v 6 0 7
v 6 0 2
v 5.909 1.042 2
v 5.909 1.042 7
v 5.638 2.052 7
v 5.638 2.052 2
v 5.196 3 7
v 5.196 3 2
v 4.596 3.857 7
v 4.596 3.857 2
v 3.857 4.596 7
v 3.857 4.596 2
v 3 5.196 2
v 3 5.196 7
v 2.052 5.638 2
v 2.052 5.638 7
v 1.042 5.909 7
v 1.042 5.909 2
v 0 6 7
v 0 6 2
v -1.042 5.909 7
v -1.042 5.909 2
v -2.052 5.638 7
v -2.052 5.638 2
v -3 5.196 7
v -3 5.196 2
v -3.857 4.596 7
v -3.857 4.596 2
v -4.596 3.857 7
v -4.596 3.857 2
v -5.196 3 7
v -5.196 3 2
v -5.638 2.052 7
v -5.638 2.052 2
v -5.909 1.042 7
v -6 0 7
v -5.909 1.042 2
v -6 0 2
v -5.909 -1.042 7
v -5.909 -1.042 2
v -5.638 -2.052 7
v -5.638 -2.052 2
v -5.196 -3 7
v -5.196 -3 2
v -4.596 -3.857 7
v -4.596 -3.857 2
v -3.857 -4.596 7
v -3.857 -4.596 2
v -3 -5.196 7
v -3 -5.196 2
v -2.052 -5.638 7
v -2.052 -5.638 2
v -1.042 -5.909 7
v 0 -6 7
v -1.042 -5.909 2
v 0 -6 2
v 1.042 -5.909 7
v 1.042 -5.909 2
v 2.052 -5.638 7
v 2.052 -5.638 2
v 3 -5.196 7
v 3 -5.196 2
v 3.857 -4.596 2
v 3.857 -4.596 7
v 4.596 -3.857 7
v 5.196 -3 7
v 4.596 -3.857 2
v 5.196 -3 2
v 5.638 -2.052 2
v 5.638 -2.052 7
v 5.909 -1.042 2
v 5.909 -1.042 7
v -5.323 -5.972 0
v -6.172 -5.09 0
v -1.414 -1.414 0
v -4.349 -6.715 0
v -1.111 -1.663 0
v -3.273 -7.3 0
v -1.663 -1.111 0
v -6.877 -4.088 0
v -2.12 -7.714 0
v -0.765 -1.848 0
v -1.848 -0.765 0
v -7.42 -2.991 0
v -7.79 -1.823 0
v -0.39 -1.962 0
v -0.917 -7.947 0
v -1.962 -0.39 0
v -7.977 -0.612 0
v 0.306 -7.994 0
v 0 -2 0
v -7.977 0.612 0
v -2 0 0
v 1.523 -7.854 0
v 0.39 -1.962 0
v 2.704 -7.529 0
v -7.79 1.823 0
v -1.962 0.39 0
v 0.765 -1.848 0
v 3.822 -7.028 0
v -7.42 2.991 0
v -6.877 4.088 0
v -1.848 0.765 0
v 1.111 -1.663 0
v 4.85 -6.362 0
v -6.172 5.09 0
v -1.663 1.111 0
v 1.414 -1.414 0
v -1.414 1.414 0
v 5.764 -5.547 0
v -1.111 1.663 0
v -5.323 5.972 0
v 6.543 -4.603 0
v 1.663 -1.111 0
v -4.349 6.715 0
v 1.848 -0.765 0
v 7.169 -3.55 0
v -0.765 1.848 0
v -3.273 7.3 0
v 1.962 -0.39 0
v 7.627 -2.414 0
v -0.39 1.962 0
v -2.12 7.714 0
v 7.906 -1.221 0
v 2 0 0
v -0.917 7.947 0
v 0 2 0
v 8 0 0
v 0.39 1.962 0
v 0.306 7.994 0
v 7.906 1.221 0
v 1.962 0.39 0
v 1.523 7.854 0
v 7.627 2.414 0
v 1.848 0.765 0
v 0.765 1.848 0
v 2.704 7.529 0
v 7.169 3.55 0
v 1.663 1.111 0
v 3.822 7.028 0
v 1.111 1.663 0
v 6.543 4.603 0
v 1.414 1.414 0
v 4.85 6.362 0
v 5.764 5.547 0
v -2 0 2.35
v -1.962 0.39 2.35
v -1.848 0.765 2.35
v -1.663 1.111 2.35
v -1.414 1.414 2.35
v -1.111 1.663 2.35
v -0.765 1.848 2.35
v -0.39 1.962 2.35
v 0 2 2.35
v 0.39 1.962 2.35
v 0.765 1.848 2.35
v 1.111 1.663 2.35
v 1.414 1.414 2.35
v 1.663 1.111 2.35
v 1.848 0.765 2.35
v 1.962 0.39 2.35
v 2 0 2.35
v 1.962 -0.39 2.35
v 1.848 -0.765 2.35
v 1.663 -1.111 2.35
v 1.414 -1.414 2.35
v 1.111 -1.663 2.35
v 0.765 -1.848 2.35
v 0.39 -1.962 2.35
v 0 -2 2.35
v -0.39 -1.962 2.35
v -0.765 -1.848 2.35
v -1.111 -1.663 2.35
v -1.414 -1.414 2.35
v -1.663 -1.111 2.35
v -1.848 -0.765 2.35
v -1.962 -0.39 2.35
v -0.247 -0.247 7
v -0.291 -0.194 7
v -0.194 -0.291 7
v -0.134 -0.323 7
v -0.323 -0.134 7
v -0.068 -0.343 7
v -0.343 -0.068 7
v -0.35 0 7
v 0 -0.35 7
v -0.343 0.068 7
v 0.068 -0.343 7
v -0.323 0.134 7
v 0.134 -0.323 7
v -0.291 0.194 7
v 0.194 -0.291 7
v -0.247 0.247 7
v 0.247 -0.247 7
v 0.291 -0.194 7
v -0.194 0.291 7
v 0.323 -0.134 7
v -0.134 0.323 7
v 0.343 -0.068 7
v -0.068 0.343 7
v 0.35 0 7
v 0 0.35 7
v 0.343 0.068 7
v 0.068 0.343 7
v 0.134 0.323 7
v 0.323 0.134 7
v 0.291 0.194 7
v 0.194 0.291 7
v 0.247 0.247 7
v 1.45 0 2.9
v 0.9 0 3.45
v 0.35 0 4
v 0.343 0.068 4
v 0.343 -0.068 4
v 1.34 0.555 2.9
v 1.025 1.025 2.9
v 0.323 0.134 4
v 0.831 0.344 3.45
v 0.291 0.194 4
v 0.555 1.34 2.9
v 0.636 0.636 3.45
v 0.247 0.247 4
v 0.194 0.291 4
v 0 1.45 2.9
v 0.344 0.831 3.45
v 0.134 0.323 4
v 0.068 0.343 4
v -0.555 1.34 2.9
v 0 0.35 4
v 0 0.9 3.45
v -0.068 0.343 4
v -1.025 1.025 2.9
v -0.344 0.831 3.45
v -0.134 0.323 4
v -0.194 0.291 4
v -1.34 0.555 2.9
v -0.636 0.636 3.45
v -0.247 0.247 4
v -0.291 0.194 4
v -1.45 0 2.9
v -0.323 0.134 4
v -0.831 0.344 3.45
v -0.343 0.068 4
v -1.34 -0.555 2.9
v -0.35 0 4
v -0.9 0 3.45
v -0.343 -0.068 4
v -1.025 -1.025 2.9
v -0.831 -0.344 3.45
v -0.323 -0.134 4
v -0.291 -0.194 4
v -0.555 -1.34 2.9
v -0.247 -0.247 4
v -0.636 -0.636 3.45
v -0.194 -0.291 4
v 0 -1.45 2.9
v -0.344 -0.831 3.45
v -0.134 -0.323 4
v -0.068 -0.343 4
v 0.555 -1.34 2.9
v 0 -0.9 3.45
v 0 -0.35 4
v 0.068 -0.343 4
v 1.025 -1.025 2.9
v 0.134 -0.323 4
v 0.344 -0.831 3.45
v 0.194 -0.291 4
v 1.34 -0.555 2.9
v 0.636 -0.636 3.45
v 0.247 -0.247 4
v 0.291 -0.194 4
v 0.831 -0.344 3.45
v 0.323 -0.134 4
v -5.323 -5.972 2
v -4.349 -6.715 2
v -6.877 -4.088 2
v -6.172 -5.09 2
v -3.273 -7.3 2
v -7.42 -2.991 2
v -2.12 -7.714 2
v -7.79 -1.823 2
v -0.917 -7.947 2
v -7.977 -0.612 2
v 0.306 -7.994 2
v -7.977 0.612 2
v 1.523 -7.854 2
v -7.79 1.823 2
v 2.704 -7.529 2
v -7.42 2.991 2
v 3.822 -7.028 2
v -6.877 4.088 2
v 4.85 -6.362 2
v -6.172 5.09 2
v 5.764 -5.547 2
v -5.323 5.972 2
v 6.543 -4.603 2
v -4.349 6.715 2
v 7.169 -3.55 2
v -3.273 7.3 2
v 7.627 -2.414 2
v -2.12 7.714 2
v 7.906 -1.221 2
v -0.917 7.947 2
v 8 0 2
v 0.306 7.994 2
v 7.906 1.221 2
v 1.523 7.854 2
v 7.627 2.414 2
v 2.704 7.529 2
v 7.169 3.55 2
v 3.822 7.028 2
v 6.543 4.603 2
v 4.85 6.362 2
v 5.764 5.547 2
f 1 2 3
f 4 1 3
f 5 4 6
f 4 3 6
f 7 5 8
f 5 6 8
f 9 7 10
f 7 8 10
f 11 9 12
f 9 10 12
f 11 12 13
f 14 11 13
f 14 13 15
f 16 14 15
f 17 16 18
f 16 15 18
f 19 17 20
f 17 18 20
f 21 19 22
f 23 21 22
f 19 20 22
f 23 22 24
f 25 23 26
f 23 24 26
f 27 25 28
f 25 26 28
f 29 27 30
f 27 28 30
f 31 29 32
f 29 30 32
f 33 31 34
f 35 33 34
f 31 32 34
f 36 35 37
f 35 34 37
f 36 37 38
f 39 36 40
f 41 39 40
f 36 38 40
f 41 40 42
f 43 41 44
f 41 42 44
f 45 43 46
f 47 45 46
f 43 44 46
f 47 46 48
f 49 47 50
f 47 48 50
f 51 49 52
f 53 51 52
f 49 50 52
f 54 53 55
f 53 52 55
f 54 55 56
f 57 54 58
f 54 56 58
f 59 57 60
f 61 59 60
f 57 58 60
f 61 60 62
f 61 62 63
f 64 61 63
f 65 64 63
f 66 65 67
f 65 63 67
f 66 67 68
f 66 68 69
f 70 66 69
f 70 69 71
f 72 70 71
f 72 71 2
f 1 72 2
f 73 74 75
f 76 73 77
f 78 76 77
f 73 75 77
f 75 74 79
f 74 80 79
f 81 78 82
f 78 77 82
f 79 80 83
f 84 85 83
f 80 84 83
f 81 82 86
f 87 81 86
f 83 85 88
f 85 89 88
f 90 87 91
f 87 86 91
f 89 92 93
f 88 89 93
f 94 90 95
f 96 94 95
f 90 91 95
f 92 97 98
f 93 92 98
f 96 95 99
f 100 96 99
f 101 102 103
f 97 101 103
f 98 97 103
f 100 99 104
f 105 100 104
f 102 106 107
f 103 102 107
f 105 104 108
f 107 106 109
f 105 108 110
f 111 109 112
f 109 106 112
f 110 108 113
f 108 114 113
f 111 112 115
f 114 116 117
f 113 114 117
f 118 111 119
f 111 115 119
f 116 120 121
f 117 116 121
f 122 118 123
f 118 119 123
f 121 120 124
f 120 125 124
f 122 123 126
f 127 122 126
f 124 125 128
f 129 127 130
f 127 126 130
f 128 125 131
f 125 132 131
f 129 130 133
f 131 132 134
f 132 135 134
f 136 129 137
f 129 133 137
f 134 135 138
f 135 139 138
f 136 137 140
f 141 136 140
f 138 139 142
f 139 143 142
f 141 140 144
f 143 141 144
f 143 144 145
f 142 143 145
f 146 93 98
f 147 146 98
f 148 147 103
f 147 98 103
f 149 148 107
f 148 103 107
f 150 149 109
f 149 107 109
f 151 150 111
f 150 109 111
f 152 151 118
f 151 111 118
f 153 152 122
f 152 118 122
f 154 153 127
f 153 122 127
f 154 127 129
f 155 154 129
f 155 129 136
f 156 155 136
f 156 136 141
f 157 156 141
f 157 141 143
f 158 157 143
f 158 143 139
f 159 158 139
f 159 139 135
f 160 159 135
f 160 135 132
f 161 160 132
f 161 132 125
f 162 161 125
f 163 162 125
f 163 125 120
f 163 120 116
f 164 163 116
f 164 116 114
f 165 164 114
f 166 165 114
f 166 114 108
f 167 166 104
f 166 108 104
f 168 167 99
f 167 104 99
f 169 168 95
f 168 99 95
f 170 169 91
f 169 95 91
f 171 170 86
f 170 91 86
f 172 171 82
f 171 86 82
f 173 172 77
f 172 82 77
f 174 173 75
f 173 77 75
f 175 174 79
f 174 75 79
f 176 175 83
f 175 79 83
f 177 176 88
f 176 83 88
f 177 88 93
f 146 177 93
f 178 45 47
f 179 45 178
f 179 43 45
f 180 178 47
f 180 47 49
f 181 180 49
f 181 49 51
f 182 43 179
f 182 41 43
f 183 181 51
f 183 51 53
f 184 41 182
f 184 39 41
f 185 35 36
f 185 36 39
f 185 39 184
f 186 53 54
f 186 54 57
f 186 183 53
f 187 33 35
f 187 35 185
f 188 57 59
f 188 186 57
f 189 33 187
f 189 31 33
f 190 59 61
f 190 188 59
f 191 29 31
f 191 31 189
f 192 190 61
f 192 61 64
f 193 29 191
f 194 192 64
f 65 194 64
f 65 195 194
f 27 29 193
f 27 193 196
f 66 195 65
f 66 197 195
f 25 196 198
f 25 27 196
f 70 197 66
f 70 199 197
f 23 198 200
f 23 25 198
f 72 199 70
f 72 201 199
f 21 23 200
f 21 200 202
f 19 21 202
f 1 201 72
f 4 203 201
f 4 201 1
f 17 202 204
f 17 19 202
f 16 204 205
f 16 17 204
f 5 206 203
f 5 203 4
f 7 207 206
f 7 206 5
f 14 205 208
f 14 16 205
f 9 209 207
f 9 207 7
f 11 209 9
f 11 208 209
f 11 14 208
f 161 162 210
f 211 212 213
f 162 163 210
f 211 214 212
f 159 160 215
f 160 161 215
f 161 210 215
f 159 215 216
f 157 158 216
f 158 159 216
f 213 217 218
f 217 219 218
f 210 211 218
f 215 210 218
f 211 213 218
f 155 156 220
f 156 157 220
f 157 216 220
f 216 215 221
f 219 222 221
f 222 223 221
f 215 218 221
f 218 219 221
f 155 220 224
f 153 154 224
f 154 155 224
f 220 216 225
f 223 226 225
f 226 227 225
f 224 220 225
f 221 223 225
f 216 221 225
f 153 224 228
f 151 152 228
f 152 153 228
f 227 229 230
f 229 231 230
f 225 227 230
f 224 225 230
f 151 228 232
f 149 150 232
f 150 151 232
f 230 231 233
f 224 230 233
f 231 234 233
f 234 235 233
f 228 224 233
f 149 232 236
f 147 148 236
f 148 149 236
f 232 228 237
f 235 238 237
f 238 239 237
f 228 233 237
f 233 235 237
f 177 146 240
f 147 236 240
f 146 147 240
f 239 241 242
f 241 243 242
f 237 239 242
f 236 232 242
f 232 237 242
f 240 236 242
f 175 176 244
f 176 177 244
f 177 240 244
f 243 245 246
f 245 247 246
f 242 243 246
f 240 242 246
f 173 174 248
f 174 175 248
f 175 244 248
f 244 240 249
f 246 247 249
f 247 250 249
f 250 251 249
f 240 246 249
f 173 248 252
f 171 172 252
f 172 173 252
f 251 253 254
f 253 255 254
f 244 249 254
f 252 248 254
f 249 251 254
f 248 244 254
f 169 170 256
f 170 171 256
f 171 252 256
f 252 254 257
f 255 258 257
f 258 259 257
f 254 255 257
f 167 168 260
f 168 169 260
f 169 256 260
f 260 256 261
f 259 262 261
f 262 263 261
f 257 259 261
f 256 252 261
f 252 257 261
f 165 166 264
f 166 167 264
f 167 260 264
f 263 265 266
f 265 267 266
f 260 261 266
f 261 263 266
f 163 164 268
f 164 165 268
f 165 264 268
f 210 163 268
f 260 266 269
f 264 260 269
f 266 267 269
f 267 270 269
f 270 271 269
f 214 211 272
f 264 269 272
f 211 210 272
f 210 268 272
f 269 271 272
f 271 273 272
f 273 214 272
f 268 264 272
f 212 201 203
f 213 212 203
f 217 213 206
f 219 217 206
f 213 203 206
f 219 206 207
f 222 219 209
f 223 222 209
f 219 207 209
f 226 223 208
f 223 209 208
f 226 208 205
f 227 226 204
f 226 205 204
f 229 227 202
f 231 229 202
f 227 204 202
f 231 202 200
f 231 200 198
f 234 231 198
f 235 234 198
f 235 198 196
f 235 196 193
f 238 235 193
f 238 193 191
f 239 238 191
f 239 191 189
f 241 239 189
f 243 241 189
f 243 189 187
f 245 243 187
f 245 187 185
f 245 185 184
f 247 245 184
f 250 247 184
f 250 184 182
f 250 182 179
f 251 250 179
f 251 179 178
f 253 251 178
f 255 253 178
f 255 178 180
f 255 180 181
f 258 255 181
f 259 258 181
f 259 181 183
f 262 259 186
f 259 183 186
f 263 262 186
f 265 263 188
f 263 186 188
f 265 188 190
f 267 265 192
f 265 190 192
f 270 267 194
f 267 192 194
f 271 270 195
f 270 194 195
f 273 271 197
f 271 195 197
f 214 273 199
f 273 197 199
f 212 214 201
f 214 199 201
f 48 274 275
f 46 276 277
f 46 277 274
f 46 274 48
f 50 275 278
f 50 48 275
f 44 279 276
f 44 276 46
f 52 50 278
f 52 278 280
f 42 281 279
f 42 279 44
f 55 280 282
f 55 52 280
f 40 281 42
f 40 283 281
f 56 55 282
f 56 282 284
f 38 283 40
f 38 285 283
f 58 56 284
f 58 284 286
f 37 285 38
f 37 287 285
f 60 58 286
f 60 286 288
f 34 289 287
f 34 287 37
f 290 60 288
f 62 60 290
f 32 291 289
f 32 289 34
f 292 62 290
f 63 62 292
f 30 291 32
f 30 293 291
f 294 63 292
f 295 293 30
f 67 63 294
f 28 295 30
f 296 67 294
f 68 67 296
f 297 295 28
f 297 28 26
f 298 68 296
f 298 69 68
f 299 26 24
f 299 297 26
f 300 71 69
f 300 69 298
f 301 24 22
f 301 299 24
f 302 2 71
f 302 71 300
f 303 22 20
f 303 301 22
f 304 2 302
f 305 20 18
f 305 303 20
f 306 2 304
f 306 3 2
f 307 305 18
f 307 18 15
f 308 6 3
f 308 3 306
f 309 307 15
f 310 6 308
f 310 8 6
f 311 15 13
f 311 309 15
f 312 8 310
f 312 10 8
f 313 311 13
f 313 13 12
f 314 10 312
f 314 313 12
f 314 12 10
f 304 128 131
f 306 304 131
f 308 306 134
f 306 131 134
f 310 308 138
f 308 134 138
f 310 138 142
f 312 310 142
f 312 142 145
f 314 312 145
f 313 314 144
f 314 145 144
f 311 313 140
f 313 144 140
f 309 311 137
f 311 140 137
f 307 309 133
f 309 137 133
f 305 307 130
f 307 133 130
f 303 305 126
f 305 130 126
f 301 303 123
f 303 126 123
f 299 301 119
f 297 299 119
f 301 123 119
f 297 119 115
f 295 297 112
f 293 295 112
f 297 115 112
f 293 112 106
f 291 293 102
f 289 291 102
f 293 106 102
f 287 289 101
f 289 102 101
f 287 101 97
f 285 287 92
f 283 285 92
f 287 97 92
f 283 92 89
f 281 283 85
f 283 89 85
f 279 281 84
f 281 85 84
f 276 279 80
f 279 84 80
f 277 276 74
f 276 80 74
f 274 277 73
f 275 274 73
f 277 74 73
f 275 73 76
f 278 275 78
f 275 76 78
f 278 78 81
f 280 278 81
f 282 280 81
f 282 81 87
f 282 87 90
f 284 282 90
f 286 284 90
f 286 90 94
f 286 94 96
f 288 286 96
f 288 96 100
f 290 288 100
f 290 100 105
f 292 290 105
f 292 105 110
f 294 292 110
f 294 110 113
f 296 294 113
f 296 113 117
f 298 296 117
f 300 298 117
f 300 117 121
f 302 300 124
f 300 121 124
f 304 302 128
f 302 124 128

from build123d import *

# Parameters (mm, degrees)
SKETCH1_R           = 8
BOSS_EXTRUDE1_DEPTH = 2
SKETCH2_R           = 6
BOSS_EXTRUDE2_DEPTH = 5
SKETCH3_R           = 2
CUT_EXTRUDE1_DEPTH  = 2
SKETCH4_R           = 0.35
CUT_EXTRUDE2_DEPTH  = 14.304134696
CHAMFER2_SIZE       = 2


with BuildPart() as part:
    # Sketch1 → Boss-Extrude1 (new body)
    with BuildSketch(Plane.XY):
        Circle(SKETCH1_R)
    extrude(amount=BOSS_EXTRUDE1_DEPTH)

    # Sketch2 → Boss-Extrude2 (add)
    with BuildSketch(Plane.XY.offset(2)):
        Circle(SKETCH2_R)
    extrude(amount=BOSS_EXTRUDE2_DEPTH)

    # Sketch3 → Cut-Extrude1 (cut)
    with BuildSketch(Plane(origin=(0, 0, 0), x_dir=(-1, 0, 0), z_dir=(0, 0, -1))):
        Circle(SKETCH3_R)
    extrude(amount=-CUT_EXTRUDE1_DEPTH, mode=Mode.SUBTRACT)

    # Sketch4 → Cut-Extrude2 (cut, through all)
    with BuildSketch(Plane.XY.offset(7)):
        Circle(SKETCH4_R)
    extrude(amount=-CUT_EXTRUDE2_DEPTH, mode=Mode.SUBTRACT)

    # Chamfer2
    # the kernel refuses this chamfer: 2 mm, written as the material it takes off along each edge
    with BuildSketch(Plane(origin=(0, 0, 2), x_dir=(1, 0, 0), z_dir=(0, -1, 0))) as chamfer2_piece_1_section:
        Polygon((0.35 + CHAMFER2_SIZE, 0), (0.35, CHAMFER2_SIZE), (0.35, 0), align=None)
    chamfer2_piece_1 = revolve(axis=Axis((0, 0, 2), (0, 0, 1)), mode=Mode.PRIVATE)
    chamfer2_piece_1 = chamfer2_piece_1 & Plane(origin=(0, 0, 3.186782056), x_dir=(-1, 0, 0), z_dir=(0, 0, -1)) * Cylinder(2, 10, mode=Mode.PRIVATE)
    add(chamfer2_piece_1, mode=Mode.SUBTRACT)


solid = part.part
